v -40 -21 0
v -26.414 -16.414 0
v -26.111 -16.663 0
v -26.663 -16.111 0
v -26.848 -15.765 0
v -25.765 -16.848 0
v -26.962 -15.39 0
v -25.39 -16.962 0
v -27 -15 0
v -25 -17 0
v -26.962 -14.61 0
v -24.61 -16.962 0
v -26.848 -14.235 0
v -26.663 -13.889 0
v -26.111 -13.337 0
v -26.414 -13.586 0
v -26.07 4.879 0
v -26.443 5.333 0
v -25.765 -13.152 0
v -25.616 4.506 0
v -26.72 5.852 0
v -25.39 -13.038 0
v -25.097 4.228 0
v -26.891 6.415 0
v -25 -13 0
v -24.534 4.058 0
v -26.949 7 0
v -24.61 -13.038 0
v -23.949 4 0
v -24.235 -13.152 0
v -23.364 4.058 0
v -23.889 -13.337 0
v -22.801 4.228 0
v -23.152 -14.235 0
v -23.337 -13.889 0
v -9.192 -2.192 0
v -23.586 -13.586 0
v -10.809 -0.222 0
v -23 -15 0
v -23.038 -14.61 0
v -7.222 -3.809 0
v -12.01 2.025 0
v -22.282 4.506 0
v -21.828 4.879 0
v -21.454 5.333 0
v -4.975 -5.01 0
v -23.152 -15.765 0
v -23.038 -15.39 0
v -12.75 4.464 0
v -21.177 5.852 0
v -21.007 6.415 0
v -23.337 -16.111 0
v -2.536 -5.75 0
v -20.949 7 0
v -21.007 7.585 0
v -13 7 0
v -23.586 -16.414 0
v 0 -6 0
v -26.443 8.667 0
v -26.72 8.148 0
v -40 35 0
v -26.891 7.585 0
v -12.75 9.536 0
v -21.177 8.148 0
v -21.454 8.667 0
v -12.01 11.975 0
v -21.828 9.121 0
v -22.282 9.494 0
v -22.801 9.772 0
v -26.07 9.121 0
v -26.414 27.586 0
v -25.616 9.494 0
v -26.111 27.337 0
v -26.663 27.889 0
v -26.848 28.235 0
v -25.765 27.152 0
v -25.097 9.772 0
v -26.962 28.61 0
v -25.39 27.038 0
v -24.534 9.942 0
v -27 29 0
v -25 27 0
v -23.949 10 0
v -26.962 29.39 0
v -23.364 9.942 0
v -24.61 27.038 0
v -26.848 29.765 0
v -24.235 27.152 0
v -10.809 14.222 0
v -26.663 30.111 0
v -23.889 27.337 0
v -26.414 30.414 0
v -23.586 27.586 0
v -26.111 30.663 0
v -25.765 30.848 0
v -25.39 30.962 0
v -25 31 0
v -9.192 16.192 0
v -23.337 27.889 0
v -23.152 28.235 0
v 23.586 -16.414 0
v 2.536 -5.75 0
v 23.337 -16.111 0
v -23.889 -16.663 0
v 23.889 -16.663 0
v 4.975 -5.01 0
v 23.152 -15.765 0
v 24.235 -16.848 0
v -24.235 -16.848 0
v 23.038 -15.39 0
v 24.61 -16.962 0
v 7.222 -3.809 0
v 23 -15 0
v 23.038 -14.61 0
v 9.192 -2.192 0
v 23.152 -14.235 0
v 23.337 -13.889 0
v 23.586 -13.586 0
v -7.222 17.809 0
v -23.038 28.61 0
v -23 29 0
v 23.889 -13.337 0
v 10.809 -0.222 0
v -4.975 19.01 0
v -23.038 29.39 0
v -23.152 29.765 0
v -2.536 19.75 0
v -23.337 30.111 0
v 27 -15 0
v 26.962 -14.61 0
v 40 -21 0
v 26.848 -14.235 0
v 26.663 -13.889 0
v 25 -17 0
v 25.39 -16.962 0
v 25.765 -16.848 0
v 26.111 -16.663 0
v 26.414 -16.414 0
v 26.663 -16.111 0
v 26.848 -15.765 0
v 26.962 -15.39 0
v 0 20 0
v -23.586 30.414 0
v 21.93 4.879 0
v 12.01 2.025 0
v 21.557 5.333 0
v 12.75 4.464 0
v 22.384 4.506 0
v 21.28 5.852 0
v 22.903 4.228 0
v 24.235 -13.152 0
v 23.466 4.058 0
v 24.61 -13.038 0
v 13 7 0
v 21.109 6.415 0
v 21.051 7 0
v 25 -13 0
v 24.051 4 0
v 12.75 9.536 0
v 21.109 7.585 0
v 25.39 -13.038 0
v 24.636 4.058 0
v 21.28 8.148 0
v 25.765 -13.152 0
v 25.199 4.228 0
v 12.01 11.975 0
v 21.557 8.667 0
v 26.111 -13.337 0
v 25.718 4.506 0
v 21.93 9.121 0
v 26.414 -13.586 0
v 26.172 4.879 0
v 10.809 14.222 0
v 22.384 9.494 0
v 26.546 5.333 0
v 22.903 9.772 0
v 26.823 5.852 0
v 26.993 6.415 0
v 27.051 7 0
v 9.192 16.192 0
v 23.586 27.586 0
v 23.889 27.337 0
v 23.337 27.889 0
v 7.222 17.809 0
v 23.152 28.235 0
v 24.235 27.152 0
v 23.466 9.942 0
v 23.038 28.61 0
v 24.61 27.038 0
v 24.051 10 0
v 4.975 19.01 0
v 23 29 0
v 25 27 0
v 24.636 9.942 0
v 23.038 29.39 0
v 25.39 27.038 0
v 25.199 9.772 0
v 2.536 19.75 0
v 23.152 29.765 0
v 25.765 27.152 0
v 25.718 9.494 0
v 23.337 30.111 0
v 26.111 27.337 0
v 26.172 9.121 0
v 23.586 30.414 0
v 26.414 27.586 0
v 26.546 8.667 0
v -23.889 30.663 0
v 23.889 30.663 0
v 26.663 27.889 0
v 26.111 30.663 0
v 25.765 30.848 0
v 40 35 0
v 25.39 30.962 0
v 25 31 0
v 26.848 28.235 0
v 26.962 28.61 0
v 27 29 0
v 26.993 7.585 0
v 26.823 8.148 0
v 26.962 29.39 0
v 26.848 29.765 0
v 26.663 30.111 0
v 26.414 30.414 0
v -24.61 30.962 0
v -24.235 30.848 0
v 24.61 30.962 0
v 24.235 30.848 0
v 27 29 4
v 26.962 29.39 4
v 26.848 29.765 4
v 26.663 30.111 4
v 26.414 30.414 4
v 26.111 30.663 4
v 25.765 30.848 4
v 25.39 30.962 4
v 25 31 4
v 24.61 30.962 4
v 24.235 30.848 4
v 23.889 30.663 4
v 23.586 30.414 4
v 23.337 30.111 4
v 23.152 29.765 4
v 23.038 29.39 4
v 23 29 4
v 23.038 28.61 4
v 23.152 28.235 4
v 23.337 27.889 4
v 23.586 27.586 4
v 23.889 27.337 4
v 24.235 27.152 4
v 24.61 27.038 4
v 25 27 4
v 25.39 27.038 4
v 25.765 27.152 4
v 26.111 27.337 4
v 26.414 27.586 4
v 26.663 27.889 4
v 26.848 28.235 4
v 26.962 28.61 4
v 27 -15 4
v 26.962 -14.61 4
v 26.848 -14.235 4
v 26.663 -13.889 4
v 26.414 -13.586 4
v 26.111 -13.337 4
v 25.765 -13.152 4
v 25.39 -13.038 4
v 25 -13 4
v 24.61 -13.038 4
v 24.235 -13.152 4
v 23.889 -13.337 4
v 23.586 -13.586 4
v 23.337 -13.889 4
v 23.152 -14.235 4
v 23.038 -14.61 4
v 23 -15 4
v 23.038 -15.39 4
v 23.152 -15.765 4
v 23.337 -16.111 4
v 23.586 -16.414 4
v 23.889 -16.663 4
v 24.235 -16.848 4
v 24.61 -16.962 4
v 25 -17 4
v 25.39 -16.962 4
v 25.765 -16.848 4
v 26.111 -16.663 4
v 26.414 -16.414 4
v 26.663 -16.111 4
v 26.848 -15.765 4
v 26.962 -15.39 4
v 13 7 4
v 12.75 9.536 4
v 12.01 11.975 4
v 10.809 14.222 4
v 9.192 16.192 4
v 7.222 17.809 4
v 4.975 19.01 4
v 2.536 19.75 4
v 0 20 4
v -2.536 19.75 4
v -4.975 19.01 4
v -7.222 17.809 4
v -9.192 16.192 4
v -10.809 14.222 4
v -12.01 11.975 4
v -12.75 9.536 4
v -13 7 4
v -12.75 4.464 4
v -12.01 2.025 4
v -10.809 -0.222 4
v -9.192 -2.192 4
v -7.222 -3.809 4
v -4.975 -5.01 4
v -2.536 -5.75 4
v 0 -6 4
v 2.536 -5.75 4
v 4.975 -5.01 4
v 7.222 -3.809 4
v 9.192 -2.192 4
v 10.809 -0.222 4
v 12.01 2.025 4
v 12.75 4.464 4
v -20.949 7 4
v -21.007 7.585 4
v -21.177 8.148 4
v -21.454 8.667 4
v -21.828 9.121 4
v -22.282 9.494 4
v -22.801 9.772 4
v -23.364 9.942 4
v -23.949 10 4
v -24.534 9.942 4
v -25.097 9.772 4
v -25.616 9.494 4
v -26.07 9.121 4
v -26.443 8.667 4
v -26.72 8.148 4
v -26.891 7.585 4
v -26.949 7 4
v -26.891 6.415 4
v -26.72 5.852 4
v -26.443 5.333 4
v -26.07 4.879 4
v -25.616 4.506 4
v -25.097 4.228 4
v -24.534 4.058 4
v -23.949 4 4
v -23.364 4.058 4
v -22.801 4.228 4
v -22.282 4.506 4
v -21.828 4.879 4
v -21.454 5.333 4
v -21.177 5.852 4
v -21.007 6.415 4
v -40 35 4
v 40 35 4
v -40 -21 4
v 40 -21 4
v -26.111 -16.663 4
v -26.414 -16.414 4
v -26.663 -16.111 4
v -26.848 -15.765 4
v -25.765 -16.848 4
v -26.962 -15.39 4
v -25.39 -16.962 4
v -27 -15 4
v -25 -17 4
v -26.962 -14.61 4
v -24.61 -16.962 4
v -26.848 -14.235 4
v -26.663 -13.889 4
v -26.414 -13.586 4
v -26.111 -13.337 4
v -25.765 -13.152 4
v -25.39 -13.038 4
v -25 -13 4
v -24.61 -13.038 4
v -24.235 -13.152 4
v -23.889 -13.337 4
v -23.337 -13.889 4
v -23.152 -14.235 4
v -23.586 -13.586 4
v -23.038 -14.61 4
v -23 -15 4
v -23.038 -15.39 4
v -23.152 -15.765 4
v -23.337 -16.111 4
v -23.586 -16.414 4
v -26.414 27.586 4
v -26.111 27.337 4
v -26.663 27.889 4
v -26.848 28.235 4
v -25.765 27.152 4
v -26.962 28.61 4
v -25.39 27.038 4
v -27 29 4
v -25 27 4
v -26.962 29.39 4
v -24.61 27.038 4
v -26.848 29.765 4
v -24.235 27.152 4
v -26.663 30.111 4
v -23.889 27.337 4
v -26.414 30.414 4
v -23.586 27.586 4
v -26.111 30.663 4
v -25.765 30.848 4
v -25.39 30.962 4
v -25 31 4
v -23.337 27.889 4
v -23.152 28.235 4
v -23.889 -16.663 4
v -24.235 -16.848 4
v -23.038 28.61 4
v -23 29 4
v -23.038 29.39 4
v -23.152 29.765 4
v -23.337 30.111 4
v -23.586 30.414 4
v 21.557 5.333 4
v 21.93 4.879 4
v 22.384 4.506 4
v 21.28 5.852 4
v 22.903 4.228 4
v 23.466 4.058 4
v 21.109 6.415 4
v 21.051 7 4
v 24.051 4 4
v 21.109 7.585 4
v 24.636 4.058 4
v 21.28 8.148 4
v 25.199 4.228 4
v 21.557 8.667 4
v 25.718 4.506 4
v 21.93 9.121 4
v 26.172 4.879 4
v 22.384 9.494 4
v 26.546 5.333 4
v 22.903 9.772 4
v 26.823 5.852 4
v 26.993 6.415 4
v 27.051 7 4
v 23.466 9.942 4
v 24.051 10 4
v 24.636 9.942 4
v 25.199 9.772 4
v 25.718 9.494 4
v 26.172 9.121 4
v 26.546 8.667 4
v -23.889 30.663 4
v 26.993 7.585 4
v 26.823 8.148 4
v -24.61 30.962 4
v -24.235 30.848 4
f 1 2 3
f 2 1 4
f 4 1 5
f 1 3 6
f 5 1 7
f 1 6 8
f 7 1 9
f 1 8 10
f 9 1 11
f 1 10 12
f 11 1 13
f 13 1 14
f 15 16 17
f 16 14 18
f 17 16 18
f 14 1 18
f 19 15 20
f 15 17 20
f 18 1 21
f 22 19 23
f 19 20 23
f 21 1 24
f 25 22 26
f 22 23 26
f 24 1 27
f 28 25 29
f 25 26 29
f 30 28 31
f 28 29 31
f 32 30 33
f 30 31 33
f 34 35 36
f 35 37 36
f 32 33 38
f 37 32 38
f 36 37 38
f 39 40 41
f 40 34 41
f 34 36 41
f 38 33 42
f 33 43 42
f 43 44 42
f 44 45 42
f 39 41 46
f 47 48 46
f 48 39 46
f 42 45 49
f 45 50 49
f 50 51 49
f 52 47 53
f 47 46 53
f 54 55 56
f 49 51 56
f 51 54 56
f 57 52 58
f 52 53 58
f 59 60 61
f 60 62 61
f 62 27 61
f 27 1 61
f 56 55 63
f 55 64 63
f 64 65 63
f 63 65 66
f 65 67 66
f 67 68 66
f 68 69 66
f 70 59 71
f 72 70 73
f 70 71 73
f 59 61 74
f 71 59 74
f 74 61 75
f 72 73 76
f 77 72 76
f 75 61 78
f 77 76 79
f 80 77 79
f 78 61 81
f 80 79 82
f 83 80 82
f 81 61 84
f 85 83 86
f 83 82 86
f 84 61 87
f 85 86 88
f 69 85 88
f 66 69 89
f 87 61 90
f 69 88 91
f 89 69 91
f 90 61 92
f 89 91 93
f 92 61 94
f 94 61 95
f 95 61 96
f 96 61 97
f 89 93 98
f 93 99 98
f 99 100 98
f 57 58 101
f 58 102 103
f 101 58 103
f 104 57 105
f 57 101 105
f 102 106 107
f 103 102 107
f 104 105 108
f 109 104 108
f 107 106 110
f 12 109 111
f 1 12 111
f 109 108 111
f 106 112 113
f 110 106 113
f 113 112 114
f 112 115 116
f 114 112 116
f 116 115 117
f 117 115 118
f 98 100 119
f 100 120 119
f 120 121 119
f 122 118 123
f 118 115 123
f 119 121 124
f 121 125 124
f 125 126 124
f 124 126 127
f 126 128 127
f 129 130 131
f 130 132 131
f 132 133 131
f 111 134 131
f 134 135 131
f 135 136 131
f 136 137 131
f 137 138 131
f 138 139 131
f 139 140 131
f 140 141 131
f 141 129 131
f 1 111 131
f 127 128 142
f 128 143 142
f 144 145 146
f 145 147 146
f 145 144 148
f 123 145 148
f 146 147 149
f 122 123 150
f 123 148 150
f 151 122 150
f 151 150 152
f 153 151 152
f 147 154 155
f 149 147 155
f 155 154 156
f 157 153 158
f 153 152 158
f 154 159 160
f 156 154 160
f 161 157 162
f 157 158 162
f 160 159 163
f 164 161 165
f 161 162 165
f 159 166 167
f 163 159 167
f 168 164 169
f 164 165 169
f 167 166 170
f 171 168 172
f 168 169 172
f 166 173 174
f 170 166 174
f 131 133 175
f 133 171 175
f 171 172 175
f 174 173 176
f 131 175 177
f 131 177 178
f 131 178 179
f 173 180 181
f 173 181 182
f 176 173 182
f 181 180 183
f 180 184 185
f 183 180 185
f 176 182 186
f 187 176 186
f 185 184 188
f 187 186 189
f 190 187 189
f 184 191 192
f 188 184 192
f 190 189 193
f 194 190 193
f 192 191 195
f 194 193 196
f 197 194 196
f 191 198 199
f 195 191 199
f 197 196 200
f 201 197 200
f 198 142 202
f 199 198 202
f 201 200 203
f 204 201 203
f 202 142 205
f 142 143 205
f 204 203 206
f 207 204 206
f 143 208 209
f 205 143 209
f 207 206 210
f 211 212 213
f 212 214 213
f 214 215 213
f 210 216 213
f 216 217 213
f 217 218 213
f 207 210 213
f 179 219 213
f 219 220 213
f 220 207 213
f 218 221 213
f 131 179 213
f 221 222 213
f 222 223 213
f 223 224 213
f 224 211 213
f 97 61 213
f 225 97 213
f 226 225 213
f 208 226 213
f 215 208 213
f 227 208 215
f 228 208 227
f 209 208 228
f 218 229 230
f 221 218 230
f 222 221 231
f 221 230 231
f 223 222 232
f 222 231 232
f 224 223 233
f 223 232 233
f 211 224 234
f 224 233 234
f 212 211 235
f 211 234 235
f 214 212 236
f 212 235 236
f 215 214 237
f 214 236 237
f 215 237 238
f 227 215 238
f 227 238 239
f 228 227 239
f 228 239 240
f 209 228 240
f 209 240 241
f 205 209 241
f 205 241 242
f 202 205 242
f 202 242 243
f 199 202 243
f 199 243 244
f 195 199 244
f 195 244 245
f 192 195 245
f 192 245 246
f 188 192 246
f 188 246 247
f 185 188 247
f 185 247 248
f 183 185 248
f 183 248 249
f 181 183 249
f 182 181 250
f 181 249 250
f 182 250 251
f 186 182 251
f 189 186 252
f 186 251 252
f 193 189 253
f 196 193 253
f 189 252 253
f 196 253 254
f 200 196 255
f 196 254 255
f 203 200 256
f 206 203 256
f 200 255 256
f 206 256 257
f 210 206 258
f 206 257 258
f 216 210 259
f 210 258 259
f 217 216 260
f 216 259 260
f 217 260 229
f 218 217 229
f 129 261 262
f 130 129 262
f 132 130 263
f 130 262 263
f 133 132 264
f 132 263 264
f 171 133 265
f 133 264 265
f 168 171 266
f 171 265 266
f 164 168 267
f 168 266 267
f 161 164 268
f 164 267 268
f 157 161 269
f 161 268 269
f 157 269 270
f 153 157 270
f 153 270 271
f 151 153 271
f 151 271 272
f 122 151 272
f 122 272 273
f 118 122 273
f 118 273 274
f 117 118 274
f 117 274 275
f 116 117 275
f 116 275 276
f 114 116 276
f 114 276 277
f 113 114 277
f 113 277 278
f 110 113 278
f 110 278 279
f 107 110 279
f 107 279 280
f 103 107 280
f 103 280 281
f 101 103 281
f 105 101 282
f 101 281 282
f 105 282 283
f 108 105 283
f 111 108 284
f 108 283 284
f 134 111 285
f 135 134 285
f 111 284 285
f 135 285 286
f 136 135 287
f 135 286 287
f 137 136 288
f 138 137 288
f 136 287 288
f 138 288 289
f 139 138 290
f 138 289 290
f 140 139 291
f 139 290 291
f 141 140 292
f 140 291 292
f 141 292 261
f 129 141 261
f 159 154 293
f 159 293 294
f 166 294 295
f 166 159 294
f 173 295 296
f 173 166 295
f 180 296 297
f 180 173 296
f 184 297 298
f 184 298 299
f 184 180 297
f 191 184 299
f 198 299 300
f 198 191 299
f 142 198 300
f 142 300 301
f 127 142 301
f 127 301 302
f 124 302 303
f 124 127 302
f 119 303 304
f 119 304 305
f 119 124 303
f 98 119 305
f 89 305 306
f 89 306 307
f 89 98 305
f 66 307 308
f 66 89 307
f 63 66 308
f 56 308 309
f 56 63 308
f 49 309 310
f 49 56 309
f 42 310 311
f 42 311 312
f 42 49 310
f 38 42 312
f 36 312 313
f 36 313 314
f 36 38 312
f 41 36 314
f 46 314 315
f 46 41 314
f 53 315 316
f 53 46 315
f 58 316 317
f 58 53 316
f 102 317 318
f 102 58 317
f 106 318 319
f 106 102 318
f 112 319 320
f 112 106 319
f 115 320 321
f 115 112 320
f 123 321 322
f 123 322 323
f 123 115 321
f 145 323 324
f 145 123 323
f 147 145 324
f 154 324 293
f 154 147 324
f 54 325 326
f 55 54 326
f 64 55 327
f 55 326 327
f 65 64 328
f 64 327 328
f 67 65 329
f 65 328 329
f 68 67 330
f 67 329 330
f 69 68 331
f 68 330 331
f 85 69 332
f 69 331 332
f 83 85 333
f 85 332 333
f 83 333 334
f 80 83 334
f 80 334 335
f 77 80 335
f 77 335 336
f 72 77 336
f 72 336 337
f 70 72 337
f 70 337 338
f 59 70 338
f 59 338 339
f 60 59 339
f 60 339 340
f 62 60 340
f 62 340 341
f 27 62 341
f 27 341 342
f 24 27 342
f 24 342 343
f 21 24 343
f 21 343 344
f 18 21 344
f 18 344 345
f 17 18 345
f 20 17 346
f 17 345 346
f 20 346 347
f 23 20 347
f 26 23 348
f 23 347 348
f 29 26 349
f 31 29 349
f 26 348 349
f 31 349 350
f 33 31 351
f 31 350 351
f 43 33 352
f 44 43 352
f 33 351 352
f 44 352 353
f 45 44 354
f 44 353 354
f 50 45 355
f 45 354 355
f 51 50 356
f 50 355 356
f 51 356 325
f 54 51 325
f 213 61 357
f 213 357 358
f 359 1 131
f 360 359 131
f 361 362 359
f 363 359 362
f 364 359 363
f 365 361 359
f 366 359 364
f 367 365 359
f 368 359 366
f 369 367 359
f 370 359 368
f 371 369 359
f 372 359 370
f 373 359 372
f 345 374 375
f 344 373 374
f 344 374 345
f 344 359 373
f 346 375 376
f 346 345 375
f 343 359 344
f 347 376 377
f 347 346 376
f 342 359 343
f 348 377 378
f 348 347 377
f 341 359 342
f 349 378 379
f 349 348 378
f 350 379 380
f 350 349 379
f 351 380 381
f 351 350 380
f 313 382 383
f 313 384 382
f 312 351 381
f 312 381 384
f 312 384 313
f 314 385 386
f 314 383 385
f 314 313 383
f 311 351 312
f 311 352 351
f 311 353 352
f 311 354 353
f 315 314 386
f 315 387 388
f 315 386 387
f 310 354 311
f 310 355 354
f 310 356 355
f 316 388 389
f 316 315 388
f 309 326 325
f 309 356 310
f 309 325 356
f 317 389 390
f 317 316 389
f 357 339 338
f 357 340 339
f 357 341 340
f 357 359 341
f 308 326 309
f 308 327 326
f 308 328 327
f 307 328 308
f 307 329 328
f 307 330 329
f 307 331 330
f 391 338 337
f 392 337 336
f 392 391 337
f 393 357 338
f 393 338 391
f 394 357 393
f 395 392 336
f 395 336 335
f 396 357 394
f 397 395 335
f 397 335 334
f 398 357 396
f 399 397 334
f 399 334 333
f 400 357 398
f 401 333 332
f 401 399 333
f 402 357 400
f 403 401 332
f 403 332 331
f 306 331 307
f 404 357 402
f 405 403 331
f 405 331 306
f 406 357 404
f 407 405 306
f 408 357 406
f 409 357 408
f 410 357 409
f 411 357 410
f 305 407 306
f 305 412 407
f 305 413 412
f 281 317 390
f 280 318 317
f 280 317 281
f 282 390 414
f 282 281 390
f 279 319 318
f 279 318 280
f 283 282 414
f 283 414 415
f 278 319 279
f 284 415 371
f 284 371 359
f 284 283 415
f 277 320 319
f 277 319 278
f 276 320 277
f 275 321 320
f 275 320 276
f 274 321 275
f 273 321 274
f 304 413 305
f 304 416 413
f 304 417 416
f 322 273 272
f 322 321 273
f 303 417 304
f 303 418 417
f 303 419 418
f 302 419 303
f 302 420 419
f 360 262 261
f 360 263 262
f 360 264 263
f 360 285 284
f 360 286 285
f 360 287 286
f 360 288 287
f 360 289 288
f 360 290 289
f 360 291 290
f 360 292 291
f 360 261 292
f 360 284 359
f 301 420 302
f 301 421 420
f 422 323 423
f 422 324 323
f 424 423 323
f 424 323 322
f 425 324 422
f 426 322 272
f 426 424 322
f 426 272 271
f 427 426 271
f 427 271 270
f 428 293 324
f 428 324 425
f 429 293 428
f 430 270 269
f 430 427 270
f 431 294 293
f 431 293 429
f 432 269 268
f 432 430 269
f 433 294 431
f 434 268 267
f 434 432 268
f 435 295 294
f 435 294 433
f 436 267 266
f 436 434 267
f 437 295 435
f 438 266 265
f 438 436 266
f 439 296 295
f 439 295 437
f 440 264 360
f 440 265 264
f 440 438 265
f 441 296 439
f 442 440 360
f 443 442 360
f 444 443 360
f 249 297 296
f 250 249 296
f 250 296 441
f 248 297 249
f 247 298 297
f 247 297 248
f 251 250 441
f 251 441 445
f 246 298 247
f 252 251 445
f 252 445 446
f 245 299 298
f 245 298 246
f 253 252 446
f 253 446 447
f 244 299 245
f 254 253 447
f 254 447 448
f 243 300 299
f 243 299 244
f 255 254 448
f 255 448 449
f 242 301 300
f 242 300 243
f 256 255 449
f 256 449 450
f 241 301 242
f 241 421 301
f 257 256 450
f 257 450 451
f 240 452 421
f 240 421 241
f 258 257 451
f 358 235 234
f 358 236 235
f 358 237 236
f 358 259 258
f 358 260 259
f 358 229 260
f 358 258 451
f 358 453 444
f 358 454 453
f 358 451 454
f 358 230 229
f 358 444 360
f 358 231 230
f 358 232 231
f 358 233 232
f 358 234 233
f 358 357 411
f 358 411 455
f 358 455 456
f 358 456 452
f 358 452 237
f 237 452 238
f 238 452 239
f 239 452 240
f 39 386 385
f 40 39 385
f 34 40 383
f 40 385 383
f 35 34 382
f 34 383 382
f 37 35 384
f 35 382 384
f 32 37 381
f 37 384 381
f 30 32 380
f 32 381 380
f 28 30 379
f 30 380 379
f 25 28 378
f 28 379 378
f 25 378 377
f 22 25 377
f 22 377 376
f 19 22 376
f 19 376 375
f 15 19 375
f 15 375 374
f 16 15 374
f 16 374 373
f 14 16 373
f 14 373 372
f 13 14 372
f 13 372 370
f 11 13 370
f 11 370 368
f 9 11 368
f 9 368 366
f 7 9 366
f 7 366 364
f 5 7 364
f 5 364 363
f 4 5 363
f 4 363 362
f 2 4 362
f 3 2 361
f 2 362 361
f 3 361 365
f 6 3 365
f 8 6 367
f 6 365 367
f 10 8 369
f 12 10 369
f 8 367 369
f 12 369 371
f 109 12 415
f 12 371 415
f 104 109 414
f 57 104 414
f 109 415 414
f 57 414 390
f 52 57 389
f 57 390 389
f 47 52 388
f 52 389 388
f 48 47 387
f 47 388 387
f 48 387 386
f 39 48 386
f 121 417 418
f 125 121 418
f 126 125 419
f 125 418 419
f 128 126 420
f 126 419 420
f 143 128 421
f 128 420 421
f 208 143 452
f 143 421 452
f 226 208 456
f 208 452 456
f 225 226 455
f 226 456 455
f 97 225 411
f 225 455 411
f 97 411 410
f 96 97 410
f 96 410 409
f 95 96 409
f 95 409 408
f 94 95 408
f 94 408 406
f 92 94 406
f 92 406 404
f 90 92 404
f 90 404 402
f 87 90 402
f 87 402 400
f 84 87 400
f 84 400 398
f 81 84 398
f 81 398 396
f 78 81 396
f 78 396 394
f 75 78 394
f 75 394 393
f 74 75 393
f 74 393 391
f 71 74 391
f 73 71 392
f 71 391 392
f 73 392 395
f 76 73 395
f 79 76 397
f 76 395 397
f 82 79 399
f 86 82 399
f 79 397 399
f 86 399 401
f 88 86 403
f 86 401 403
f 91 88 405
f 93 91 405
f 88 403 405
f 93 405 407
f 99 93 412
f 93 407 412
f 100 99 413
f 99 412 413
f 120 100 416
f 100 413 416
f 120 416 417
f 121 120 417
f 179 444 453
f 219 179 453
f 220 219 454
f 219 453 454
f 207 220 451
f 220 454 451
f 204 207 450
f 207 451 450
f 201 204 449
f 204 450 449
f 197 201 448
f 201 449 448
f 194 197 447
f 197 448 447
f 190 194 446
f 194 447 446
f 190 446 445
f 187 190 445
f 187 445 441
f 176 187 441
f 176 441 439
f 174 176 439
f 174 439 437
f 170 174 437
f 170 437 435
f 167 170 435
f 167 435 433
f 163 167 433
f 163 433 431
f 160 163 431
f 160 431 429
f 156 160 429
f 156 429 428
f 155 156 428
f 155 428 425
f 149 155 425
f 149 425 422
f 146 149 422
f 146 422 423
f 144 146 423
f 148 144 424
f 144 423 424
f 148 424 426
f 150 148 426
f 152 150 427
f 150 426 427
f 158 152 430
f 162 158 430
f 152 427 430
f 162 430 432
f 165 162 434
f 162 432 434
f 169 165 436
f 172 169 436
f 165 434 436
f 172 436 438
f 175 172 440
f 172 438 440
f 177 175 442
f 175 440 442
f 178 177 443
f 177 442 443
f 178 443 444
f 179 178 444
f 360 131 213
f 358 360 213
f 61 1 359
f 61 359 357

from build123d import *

# Parameters (mm, degrees)
SKETCH_1_W                  = 80
SKETCH_1_H                  = 56
SKETCH_1_R                  = 13
EXTRUDE_1_DEPTH             = 4
SKETCH_2_R                  = 2
CUT_EXTRUDE_1_DEPTH         = 100
PATTERN_LINEAR_1_COUNT      = 2
PATTERN_LINEAR_1_PITCH      = 44
PATTERN_LINEAR_1_COUNT_DIR2 = 2
PATTERN_LINEAR_1_PITCH_DIR2 = 50
SKETCH_3_R                  = 3
CUT_EXTRUDE_2_DEPTH         = 50


with BuildPart() as part:
    # 草图1 → 凸台-拉伸1 (new body)
    with BuildSketch(Plane.XY):
        with Locations((0, 7)):
            Rectangle(SKETCH_1_W, SKETCH_1_H)
        with Locations((0, 7)):
            Circle(SKETCH_1_R, mode=Mode.SUBTRACT)
    extrude(amount=EXTRUDE_1_DEPTH)

    # 草图2 → 切除-拉伸1 (cut)
    with BuildSketch(Plane.XY.offset(4)):
        with Locations((-25, -15)):
            Circle(SKETCH_2_R)
    cut_extrude_1 = extrude(amount=-CUT_EXTRUDE_1_DEPTH, mode=Mode.SUBTRACT)

    # 阵列(线性)1: Cut-Extrude 1 2 × 2
    with Locations(*[(j * PATTERN_LINEAR_1_PITCH_DIR2, i * PATTERN_LINEAR_1_PITCH, 0) for i in range(PATTERN_LINEAR_1_COUNT) for j in range(PATTERN_LINEAR_1_COUNT_DIR2) if (i, j) != (0, 0)]):
        add(cut_extrude_1, mode=Mode.SUBTRACT)

    # 草图3 → 切除-拉伸2 (cut)
    with BuildSketch(Plane.XY.offset(4)):
        with Locations((24.051141157, 7)):
            Circle(SKETCH_3_R)
        with Locations((-23.948858843, 7)):
            Circle(SKETCH_3_R)
    extrude(amount=-CUT_EXTRUDE_2_DEPTH, mode=Mode.SUBTRACT)


solid = part.part
